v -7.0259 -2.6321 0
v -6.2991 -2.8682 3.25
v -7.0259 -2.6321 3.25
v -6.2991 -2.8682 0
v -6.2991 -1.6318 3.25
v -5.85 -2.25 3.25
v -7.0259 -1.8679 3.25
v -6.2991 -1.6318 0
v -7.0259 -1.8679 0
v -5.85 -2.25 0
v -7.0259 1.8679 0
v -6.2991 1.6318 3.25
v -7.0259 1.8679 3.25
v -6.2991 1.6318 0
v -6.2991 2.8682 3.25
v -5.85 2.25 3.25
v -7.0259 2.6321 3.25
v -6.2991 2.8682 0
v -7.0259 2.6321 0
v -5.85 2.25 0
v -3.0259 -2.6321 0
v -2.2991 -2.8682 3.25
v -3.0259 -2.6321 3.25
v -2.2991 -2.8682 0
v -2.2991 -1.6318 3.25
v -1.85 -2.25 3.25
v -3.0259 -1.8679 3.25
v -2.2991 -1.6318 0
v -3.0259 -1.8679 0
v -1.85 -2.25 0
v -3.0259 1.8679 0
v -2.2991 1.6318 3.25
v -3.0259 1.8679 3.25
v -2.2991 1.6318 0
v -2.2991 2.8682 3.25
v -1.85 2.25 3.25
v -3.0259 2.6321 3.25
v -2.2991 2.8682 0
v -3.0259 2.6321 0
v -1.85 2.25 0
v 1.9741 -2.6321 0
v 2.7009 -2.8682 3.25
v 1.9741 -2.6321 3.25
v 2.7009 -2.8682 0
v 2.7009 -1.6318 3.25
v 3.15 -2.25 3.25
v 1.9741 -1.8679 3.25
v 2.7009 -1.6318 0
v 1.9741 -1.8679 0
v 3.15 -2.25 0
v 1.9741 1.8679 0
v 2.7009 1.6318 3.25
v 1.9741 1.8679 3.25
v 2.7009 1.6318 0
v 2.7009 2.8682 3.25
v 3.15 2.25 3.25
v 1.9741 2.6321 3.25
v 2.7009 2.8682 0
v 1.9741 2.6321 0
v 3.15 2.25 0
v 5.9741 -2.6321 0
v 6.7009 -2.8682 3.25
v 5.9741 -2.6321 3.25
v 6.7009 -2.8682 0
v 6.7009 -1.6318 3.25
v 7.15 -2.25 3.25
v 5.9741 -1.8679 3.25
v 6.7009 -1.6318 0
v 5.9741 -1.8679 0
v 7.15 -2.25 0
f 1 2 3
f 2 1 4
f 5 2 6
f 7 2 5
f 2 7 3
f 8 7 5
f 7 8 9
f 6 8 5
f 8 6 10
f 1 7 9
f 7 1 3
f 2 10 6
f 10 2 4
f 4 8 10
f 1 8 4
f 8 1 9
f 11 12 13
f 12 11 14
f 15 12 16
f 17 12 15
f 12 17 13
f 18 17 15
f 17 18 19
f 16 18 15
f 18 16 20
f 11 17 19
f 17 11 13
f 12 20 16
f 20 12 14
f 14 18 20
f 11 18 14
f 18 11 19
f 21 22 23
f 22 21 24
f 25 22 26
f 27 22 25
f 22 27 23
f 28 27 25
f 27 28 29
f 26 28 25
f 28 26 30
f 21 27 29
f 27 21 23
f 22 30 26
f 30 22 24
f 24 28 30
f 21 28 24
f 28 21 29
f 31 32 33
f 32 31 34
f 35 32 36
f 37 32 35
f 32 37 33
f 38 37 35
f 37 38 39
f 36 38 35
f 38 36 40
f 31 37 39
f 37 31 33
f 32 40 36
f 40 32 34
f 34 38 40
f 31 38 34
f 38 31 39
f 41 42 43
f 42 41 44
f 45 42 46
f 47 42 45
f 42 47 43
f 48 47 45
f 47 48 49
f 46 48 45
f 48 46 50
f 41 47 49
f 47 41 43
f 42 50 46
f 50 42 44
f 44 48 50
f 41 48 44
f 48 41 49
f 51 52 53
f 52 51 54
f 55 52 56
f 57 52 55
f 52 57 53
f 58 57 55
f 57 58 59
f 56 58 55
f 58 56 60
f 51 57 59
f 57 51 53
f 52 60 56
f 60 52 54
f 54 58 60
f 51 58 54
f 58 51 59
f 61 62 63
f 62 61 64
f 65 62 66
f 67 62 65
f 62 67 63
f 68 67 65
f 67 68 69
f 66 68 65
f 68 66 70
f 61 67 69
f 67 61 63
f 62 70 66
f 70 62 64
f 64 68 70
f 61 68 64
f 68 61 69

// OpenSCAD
union() {
  translate([-6.5, -2.25, 0.0]) cylinder(r=0.65, h=3.25);
  translate([-6.5, 2.25, 0.0]) cylinder(r=0.65, h=3.25);
  translate([-2.5, -2.25, 0.0]) cylinder(r=0.65, h=3.25);
  translate([-2.5, 2.25, 0.0]) cylinder(r=0.65, h=3.25);
  translate([2.5, -2.25, 0.0]) cylinder(r=0.65, h=3.25);
  translate([2.5, 2.25, 0.0]) cylinder(r=0.65, h=3.25);
  translate([6.5, -2.25, 0.0]) cylinder(r=0.65, h=3.25);
}
